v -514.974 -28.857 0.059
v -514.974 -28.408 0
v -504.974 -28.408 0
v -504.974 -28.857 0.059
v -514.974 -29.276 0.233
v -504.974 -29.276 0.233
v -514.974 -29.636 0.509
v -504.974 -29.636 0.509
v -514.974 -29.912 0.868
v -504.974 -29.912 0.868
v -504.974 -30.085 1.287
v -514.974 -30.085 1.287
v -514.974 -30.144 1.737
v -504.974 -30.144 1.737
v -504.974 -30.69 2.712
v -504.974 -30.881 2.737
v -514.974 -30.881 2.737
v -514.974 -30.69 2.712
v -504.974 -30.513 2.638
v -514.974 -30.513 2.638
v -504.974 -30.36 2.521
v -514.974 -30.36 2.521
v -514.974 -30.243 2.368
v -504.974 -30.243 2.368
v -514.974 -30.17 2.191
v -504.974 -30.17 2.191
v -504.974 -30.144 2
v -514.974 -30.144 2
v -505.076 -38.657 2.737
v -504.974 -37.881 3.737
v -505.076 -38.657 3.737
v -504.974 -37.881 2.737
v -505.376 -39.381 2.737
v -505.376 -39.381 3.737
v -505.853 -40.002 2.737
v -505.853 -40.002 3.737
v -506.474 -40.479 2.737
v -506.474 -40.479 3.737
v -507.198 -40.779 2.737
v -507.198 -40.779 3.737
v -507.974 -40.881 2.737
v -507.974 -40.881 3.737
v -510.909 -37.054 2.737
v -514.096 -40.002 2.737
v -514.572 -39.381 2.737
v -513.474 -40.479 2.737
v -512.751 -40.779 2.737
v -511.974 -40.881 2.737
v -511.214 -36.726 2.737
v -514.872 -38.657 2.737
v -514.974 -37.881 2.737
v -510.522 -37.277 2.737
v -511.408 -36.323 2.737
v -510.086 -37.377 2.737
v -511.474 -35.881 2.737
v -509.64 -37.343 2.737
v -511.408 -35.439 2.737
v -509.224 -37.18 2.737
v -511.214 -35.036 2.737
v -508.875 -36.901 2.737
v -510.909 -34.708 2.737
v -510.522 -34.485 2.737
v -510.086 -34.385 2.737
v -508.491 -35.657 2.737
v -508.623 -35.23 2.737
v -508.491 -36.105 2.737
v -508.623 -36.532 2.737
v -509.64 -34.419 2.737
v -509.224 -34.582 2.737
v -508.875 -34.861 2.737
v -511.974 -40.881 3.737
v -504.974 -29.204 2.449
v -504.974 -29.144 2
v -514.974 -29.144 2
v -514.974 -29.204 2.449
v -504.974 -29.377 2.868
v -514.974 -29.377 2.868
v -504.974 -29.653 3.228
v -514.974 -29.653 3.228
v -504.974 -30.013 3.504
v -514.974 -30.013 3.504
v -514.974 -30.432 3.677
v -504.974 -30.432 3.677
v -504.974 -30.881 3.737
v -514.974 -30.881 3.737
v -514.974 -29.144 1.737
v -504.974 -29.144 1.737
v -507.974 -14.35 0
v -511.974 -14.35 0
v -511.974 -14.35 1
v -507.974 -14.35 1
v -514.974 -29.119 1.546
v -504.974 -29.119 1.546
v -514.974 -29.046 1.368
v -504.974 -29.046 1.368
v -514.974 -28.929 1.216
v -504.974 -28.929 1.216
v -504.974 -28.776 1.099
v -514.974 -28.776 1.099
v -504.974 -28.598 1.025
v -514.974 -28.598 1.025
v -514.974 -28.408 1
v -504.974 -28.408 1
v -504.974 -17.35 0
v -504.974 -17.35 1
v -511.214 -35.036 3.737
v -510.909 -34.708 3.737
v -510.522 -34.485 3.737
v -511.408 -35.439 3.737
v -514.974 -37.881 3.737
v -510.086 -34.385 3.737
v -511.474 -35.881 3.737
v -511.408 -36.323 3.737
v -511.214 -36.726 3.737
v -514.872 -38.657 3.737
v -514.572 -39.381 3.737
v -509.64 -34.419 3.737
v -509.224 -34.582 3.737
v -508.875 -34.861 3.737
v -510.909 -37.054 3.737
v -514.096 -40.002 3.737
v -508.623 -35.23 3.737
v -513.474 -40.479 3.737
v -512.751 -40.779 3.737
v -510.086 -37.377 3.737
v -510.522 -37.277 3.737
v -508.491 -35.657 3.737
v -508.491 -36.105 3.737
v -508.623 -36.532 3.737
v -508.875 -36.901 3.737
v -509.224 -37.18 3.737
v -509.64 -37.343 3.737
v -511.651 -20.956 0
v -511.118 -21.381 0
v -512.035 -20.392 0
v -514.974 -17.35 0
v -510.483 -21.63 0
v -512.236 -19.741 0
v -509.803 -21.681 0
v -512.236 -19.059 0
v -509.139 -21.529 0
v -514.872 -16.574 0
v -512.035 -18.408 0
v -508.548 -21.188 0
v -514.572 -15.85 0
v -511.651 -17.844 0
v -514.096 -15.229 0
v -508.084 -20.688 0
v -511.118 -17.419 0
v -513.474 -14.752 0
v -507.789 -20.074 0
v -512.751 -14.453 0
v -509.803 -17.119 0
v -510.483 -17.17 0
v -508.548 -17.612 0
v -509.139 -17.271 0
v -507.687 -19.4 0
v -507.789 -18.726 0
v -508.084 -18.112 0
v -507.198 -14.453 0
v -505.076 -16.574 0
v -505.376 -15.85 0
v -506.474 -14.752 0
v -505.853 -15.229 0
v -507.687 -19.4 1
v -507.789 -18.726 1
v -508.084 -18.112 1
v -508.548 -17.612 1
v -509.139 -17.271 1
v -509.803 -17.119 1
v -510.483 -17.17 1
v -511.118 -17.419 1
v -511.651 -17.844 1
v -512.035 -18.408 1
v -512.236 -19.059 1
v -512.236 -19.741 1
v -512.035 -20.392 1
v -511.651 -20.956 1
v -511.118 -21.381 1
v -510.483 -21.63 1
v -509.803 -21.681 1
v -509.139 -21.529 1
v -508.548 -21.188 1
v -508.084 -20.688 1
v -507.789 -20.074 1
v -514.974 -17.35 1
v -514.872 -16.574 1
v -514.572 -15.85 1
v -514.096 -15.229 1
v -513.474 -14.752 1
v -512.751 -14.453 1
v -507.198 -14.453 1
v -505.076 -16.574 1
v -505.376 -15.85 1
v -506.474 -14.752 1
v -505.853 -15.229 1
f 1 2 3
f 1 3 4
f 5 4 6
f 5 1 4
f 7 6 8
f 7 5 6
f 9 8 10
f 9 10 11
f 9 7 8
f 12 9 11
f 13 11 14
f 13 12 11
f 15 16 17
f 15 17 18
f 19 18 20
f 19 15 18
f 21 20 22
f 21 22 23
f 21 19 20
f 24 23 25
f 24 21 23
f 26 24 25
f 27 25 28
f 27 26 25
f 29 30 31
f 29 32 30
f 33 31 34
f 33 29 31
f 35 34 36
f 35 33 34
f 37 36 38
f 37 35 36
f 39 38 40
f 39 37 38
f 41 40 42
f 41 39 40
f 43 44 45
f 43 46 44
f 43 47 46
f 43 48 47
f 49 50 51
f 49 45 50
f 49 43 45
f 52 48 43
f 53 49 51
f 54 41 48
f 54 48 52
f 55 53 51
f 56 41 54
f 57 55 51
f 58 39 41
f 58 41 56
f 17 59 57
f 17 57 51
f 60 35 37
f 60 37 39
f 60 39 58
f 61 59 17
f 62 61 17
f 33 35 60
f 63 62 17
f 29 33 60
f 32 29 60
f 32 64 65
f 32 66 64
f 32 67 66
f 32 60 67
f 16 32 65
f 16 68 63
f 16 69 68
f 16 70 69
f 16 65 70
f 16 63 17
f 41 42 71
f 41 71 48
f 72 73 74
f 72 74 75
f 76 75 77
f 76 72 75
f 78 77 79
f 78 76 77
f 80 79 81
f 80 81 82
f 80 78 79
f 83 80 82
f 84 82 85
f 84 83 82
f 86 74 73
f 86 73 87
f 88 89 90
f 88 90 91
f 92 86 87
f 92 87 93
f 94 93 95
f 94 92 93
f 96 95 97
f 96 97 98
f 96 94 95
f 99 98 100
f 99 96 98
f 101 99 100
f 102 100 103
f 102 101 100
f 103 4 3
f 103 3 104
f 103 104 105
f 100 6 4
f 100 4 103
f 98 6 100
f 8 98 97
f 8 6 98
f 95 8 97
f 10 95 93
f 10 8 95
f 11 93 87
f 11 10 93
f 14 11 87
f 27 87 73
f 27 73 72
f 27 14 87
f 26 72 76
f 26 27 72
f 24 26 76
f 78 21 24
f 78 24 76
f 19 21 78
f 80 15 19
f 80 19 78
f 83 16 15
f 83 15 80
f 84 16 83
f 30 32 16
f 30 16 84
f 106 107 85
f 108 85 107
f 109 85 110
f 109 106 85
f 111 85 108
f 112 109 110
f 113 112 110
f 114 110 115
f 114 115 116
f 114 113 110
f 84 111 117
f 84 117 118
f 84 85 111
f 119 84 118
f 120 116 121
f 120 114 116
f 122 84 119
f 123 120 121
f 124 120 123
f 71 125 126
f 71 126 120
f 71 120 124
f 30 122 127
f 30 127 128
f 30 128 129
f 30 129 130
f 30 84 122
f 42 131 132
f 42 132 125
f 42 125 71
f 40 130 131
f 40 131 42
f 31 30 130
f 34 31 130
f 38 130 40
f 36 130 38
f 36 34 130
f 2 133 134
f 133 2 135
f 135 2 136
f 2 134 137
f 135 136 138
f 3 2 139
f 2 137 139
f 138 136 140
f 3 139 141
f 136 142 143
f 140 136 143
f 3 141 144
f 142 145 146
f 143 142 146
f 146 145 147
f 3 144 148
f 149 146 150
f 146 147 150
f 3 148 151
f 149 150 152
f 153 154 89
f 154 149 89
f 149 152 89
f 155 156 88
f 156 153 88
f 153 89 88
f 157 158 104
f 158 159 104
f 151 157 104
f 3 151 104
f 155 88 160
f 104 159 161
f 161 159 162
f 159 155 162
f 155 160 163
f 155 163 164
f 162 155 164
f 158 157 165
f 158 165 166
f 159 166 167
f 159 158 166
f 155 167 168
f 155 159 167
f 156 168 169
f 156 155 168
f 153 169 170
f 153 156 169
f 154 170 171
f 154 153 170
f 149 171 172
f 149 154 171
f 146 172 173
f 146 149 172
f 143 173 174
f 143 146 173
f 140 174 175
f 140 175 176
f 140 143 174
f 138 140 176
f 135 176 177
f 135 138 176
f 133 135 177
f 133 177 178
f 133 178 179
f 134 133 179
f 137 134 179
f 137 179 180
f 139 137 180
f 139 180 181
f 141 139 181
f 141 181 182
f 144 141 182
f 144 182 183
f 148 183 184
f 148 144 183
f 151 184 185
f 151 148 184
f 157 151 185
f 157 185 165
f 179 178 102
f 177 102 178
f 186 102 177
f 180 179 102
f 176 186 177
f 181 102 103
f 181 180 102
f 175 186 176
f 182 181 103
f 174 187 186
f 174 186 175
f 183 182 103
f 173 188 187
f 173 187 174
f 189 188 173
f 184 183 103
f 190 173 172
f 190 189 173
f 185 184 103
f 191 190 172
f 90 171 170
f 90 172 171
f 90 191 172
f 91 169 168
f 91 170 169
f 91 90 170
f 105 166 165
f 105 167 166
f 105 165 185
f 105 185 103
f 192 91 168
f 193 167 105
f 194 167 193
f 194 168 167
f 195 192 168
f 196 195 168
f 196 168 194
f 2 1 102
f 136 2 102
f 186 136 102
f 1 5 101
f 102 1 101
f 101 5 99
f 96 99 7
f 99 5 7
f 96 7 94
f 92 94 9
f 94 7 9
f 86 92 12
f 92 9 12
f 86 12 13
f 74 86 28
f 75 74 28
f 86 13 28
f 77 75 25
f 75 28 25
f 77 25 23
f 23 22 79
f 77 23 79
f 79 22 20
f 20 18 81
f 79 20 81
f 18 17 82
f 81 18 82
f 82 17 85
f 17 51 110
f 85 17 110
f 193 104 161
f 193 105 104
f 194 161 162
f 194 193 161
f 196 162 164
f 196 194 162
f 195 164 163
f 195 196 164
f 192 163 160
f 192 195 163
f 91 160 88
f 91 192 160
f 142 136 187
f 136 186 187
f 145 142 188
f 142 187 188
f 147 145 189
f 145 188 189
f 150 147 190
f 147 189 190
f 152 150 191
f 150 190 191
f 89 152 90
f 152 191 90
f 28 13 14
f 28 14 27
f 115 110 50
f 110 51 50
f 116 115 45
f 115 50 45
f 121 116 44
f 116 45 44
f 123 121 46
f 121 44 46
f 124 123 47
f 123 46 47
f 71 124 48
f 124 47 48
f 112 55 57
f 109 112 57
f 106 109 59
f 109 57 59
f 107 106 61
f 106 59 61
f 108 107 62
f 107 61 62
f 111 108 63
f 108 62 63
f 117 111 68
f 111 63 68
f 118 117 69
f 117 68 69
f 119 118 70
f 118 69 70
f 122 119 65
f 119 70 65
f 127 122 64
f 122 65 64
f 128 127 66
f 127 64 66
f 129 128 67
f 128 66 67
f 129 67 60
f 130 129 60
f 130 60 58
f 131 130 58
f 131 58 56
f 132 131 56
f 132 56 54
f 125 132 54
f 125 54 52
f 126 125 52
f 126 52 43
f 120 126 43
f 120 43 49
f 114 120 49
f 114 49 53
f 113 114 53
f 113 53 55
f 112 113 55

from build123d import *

# Parameters (mm, degrees)
SKETCH1_W          = 10
SKETCH1_H          = 14.057527786
SKETCH1_R          = 2.287307526
BASE_FLANGE1_DEPTH = 1
EDGE_FLANGE1_DEPTH = 10
EDGE_FLANGE2_DEPTH = 10
SKETCH12_R         = 1.5
CUT_EXTRUDE1_DEPTH = 2
FILLET1_R          = 3


# Sheet-metal steps are written as plain solids
with BuildPart() as part:
    # Sketch1 → Base-Flange1 (new body)
    with BuildSketch(Plane.XY):
        with Locations((-509.974194853, -21.379047402)):
            Rectangle(SKETCH1_W, SKETCH1_H)
        with Locations((-509.974194853, -19.4)):
            Circle(SKETCH1_R, mode=Mode.SUBTRACT)
    extrude(amount=BASE_FLANGE1_DEPTH)

    # Edge-Flange1 section (across the edge) → Edge-Flange1 (add)
    with BuildSketch(Plane(origin=(-514.974194853, -29.144411295, 1), x_dir=(0, 1, 0), z_dir=(1, 0, 0))):
        with BuildLine():
            Line((-1, 0.7366), (-1, 1))
            Line((-1, 1), (0, 1))
            Line((0, 1), (0, 0.7366))
            ThreePointArc((0, 0.7366), (0.215745145, 0.215745145), (0.7366, 0))
            Line((0.7366, 0), (0.7366, -1))
            ThreePointArc((0.7366, -1), (-0.491361636, -0.491361636), (-1, 0.7366))
        make_face()
    extrude(amount=EDGE_FLANGE1_DEPTH)

    # Edge-Flange2 section (across the edge) → Edge-Flange2 (add)
    with BuildSketch(Plane(origin=(-504.974194853, -30.144411295, 2.7366), x_dir=(0, 0, -1), z_dir=(-1, 0, 0))):
        with BuildLine():
            Line((-1, 0.7366), (-1, 10.7366))
            Line((-1, 10.7366), (0, 10.7366))
            Line((0, 10.7366), (0, 0.7366))
            ThreePointArc((0, 0.7366), (0.215745145, 0.215745145), (0.7366, 0))
            Line((0.7366, 0), (0.7366, -1))
            ThreePointArc((0.7366, -1), (-0.491361636, -0.491361636), (-1, 0.7366))
        make_face()
    extrude(amount=EDGE_FLANGE2_DEPTH)

    # Sketch12 → Cut-Extrude1 (cut)
    with BuildSketch(Plane(origin=(0, 0, 2.7366), x_dir=(-1, 0, 0), z_dir=(0, 0, -1))):
        with Locations((509.974194853, -35.881011295)):
            Circle(SKETCH12_R)
    extrude(amount=-CUT_EXTRUDE1_DEPTH, mode=Mode.SUBTRACT)

    # Fillet1
    fillet1_edges = [part.edges().sort_by_distance(p)[0] for p in [
        (-504.974194853, -40.881011295, 3.2366),
        (-514.974194853, -40.881011295, 3.2366),
        (-514.974194853, -14.350283509, 0.5),
        (-504.974194853, -14.350283509, 0.5),
    ]]
    fillet(fillet1_edges, radius=FILLET1_R)


solid = part.part
